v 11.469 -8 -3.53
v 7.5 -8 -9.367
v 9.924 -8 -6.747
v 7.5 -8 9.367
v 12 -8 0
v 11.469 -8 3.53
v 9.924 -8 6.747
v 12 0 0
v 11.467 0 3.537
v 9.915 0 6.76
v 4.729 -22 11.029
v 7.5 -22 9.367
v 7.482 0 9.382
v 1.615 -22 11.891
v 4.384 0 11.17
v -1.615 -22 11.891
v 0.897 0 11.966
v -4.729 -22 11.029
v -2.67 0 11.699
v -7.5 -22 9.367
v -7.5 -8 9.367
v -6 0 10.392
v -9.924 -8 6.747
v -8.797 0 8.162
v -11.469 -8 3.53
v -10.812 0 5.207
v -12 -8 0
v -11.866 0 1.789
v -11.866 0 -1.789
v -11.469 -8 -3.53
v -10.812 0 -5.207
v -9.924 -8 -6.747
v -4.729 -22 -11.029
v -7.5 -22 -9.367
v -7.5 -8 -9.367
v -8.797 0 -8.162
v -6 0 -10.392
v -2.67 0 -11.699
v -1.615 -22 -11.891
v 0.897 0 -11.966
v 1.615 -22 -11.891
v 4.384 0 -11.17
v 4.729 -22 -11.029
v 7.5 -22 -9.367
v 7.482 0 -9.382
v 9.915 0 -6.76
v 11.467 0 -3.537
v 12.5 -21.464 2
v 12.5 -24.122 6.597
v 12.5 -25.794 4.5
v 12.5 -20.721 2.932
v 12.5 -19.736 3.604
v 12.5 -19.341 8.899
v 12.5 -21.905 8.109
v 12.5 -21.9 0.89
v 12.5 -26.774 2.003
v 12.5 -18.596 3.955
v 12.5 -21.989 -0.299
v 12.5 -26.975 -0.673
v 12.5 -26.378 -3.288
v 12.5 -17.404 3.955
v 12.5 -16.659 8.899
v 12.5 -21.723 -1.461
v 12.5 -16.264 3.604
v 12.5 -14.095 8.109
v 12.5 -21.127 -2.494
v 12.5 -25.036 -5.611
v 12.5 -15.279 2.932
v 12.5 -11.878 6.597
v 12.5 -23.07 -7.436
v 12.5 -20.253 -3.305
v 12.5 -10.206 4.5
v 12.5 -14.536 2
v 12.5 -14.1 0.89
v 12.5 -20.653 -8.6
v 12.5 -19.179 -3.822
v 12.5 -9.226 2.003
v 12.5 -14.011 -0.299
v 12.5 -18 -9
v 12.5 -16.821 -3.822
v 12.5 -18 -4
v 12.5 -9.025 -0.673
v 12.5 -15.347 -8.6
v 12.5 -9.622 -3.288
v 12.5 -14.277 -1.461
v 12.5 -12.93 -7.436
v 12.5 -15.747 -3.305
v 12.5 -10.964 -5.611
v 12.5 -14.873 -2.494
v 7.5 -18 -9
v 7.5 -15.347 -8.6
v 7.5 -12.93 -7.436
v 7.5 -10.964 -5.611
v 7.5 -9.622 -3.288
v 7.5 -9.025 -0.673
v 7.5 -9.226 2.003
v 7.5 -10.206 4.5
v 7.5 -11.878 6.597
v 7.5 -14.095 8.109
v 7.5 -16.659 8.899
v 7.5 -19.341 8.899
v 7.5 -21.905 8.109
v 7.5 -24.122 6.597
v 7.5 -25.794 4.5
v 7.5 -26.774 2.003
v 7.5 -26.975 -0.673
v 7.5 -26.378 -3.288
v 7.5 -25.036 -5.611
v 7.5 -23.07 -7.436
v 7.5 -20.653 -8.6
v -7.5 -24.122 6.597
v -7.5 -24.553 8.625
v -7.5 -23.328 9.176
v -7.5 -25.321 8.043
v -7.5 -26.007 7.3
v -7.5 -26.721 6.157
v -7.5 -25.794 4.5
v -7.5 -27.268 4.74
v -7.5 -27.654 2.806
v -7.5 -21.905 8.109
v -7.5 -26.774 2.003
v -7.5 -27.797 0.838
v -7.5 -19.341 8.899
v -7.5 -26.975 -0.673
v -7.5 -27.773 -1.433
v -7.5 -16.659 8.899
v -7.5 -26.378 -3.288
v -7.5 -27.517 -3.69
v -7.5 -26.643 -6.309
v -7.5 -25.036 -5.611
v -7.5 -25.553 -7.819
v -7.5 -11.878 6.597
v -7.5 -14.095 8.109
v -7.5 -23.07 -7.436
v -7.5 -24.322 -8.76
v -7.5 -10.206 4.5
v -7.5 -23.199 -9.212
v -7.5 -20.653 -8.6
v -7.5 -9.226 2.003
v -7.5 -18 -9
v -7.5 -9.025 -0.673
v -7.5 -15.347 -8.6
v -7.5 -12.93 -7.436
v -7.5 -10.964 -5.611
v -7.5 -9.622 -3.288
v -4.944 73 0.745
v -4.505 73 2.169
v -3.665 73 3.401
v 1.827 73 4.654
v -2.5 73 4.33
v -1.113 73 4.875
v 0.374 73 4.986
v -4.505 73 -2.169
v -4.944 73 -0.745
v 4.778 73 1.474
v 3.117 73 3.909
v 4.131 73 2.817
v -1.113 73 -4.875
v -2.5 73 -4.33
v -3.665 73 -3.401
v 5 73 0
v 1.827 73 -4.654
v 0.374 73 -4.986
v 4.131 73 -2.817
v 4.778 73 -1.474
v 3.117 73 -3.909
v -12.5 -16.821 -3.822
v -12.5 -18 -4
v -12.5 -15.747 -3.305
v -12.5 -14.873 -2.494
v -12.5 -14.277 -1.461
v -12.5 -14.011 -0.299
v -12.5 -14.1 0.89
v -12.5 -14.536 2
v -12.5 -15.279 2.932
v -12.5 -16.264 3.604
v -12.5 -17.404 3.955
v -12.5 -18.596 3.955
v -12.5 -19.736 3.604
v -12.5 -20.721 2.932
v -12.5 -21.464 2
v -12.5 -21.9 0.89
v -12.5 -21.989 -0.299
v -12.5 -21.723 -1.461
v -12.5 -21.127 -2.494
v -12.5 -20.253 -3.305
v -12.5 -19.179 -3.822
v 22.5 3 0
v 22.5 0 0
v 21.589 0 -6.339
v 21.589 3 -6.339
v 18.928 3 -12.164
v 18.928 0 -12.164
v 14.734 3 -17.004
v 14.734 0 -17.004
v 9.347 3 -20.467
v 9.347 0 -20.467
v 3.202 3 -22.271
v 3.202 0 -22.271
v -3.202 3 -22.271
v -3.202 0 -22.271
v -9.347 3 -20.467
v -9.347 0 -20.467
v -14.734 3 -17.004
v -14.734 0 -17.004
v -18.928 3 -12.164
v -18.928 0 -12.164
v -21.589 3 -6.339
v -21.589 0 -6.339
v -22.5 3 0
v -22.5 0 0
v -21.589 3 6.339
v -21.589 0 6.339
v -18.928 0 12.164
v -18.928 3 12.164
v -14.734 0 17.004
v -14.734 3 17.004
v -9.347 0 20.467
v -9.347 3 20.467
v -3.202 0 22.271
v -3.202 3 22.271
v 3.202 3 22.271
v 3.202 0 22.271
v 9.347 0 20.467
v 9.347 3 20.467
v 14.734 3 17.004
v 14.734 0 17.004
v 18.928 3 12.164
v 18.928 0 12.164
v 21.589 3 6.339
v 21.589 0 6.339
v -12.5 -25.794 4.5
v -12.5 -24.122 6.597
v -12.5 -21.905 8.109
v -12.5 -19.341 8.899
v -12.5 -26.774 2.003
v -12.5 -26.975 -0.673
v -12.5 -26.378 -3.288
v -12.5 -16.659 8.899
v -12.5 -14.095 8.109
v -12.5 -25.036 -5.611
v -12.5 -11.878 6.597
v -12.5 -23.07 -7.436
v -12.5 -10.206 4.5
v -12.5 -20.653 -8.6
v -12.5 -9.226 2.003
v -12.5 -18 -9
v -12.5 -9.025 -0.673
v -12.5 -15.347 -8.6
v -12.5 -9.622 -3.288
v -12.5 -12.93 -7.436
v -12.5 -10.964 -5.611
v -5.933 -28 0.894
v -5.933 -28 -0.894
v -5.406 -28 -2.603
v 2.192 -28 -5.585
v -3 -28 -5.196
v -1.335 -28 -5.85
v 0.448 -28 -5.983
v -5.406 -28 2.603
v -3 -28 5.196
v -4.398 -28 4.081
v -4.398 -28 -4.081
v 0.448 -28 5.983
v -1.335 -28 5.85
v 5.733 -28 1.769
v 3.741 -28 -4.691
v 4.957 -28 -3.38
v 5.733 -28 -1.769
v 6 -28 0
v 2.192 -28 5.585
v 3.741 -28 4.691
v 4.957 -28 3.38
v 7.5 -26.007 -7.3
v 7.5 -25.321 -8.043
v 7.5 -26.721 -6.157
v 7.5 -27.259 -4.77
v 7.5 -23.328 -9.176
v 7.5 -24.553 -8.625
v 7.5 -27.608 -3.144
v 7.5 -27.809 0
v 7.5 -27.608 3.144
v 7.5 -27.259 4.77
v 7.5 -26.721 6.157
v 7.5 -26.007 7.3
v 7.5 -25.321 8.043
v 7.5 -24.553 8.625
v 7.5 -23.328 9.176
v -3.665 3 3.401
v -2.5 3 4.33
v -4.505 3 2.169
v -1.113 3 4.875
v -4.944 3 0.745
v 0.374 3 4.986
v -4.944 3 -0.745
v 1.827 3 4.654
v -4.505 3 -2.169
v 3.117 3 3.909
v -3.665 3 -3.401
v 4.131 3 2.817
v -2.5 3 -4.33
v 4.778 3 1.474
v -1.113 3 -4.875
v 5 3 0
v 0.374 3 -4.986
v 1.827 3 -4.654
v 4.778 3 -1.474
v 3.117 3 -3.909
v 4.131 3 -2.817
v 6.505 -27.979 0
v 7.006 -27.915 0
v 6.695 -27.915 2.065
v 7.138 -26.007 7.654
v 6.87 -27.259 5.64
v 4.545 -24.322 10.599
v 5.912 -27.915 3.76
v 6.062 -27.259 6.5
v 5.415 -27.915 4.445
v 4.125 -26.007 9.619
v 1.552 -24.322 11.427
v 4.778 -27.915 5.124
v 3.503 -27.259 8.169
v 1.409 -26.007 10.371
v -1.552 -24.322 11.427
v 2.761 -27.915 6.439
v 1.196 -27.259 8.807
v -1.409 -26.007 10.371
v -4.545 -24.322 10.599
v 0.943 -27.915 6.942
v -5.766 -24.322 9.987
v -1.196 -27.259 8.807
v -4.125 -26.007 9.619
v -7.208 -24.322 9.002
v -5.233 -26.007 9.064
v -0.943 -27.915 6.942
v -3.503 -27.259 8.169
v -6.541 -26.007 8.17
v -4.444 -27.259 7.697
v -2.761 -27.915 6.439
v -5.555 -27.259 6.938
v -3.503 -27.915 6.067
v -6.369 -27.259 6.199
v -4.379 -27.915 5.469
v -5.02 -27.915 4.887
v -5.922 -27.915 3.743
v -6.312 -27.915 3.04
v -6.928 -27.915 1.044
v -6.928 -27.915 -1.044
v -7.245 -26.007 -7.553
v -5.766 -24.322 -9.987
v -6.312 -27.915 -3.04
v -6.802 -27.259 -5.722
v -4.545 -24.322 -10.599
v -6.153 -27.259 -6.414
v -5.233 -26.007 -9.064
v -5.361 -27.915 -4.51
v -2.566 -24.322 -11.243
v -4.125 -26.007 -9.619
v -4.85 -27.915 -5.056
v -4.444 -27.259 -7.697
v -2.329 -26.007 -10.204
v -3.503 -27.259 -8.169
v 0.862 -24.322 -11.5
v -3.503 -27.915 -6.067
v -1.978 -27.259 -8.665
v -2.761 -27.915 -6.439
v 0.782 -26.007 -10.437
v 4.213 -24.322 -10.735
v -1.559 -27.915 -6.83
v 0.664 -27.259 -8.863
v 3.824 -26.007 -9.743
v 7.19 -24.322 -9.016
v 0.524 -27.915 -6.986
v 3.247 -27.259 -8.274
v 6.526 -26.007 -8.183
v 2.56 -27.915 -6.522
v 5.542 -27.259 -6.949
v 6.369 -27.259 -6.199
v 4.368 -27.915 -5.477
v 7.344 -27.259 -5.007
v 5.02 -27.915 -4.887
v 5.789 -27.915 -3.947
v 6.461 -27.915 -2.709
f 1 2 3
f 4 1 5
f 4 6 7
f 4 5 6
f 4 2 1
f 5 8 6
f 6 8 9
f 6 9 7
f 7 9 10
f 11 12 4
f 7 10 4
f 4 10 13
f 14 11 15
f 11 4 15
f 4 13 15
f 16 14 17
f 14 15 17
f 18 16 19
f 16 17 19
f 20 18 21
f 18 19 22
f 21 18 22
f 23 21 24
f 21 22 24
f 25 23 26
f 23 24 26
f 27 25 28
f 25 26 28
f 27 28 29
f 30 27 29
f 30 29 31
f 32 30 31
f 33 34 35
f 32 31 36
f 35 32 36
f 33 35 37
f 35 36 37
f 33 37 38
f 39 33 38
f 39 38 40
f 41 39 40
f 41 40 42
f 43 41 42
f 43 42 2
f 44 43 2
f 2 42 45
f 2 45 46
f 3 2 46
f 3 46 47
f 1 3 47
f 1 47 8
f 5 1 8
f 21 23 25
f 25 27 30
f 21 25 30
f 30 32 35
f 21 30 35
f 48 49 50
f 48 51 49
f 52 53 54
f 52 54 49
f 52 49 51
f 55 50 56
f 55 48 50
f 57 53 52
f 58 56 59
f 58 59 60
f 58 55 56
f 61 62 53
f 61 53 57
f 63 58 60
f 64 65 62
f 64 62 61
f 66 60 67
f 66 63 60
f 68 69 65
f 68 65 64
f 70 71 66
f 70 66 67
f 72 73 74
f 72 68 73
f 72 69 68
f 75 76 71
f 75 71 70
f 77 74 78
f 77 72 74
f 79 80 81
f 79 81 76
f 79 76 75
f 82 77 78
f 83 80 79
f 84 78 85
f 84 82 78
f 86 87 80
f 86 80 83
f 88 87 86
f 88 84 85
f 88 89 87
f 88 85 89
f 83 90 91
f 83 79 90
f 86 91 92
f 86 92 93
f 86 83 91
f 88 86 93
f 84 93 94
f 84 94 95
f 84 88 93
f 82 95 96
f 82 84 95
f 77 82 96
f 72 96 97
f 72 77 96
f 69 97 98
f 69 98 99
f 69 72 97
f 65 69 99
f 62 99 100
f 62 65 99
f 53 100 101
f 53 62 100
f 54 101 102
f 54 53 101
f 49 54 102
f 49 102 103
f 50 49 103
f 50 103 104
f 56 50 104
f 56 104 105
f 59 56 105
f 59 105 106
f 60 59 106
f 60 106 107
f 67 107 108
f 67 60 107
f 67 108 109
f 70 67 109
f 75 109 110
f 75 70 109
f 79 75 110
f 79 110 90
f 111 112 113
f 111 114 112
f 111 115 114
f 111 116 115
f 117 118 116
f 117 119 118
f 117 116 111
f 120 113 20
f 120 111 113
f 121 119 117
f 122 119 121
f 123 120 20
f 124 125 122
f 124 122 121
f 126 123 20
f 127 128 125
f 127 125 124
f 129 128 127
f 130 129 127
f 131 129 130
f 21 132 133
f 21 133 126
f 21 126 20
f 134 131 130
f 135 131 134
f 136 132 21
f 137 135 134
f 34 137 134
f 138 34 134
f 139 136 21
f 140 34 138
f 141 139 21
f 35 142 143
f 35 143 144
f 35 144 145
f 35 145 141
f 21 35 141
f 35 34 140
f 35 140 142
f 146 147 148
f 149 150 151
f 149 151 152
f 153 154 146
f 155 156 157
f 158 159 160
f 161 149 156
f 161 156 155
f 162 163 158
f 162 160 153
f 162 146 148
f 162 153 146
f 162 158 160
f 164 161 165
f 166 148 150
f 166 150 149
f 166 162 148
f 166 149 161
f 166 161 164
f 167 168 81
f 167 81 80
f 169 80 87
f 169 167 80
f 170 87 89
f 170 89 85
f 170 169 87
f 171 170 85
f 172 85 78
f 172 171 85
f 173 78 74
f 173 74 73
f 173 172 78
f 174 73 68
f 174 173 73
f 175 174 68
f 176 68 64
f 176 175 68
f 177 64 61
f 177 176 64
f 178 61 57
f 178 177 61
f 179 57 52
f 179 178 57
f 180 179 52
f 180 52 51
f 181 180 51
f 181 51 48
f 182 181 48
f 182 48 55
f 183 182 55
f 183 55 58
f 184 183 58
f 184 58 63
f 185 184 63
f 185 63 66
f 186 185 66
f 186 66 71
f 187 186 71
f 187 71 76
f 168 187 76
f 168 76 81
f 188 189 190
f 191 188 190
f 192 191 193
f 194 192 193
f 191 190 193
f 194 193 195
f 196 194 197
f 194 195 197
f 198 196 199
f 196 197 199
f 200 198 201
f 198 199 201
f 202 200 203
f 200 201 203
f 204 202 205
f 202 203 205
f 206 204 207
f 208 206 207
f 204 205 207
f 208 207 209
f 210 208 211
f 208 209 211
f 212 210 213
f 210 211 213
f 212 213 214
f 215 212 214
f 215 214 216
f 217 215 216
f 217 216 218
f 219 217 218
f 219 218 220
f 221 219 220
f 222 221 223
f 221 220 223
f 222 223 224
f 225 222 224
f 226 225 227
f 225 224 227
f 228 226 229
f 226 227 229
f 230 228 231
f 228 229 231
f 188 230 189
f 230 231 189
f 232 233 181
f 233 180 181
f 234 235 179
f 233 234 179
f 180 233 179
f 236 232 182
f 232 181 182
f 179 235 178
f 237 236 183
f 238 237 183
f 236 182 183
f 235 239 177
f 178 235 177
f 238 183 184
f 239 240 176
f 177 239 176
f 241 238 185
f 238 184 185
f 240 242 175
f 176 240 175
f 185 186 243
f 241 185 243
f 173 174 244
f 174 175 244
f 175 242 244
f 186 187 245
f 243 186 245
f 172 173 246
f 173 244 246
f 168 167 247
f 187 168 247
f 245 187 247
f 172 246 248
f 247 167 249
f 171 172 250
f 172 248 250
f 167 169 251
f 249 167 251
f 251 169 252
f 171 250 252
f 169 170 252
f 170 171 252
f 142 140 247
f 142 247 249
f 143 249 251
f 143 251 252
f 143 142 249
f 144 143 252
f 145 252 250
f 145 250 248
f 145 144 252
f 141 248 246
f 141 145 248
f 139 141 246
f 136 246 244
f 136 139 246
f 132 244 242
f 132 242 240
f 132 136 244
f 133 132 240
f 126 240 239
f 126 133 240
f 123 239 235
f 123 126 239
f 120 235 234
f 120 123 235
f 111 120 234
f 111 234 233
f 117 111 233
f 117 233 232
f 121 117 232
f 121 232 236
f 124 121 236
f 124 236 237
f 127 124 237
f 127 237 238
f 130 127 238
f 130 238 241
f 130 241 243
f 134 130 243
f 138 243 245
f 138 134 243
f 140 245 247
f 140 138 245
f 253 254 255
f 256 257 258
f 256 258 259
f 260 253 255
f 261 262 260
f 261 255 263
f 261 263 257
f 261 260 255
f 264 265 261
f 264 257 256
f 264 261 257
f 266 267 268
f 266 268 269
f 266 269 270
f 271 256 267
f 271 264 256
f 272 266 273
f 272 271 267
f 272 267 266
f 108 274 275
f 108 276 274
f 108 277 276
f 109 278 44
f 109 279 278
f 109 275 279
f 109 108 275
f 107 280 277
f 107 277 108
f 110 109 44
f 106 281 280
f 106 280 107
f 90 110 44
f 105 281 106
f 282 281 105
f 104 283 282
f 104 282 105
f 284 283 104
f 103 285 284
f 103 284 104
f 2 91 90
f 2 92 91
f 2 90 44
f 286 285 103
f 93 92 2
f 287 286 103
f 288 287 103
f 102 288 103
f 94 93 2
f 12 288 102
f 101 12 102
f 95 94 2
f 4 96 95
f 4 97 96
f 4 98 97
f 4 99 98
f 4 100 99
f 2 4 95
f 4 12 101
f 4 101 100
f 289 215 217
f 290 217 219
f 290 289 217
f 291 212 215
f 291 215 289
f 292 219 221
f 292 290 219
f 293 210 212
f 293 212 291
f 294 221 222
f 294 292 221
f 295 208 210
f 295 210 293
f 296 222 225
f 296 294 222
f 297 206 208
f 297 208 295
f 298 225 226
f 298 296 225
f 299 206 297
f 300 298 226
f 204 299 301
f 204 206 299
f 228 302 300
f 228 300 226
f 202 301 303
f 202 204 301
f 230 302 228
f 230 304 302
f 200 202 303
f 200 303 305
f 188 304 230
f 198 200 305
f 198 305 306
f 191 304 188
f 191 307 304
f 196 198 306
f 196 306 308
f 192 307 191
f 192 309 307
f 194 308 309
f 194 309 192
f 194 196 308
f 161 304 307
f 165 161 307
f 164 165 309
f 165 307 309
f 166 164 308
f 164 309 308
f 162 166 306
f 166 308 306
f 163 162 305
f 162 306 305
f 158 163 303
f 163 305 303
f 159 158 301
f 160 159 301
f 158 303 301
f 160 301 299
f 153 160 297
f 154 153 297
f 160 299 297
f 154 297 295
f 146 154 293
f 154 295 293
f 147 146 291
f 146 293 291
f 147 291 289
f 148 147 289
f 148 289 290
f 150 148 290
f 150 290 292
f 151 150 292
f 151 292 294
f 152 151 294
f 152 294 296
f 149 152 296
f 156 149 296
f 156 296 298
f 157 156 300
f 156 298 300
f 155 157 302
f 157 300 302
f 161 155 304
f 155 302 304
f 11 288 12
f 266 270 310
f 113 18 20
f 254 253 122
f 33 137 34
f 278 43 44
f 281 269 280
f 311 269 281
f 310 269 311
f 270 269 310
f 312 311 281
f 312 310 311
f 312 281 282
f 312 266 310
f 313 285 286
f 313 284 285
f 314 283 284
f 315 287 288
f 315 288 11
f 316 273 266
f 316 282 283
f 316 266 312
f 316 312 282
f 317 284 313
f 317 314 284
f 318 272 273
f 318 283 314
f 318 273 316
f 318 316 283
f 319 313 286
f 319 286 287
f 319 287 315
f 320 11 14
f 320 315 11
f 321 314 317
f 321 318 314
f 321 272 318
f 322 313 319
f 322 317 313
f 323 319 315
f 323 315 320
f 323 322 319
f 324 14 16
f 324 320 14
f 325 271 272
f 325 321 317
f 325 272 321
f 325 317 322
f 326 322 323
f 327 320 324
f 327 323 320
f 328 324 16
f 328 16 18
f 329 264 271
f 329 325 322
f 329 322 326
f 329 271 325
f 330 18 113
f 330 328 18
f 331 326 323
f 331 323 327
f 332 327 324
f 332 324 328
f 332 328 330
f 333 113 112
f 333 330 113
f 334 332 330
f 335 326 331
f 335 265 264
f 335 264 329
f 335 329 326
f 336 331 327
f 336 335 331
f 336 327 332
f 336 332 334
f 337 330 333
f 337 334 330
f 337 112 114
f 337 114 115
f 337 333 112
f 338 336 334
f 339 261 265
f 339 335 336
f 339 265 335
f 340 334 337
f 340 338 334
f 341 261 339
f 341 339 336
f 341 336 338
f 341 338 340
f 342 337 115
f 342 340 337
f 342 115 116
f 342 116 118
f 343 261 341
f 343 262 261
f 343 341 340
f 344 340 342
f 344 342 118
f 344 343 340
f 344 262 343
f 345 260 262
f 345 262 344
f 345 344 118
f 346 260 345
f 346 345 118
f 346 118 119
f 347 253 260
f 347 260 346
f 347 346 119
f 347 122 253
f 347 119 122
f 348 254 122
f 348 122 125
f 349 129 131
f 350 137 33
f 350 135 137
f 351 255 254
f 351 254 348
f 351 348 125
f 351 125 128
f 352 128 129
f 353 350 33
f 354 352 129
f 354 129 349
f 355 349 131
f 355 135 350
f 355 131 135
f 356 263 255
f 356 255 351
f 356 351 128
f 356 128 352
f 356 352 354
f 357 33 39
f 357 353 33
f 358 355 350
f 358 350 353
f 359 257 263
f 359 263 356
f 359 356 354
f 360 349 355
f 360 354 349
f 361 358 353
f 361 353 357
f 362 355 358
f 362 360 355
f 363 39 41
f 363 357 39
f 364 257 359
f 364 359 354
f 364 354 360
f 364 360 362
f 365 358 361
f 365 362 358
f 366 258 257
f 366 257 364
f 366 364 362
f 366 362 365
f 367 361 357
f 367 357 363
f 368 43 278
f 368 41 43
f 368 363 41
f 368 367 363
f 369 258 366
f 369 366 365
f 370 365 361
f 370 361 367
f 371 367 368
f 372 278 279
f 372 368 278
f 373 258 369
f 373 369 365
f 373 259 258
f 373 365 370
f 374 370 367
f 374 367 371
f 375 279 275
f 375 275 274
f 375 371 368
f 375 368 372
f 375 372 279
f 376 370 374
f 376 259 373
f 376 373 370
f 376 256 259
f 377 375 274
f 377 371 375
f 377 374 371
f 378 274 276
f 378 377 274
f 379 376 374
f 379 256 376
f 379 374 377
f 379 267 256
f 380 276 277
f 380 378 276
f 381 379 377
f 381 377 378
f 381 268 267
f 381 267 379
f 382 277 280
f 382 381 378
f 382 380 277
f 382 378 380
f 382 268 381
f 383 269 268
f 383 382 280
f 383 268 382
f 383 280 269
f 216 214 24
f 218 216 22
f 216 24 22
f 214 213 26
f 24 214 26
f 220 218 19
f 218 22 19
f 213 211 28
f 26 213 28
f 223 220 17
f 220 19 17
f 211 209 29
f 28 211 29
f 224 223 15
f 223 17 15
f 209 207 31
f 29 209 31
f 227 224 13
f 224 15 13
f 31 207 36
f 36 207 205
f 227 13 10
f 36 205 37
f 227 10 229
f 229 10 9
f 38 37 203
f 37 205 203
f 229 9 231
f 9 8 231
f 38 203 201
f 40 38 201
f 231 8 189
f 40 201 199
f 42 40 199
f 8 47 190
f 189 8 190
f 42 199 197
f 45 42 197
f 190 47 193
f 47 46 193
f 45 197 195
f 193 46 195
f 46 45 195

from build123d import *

# Parameters (mm, degrees)
SKETCH1_R           = 22.5
BOSS_EXTRUDE1_DEPTH = 3
SKETCH2_R           = 5
BOSS_EXTRUDE2_DEPTH = 70
SKETCH3_R           = 12
BOSS_EXTRUDE3_DEPTH = 28
FILLET1_R           = 6
SKETCH4_W           = 14.522746449
SKETCH4_H           = 20
CUT_EXTRUDE2_DEPTH  = 14
SKETCH5_R           = 4
CUT_EXTRUDE3_DEPTH  = 31
SKETCH7_R           = 9
SKETCH7_R_2         = 4
BOSS_EXTRUDE4_DEPTH = 12.5


with BuildPart() as part:
    # Sketch1 → Boss-Extrude1 (new body)
    with BuildSketch(Plane(origin=(0, 0, 0), x_dir=(1, 0, 0), z_dir=(0, 1, 0))):
        Circle(SKETCH1_R)
    extrude(amount=BOSS_EXTRUDE1_DEPTH)

    # Sketch2 → Boss-Extrude2 (add)
    with BuildSketch(Plane(origin=(0, 3, 0), x_dir=(1, 0, 0), z_dir=(0, 1, 0))):
        Circle(SKETCH2_R)
    extrude(amount=BOSS_EXTRUDE2_DEPTH)

    # Sketch3 → Boss-Extrude3 (add)
    with BuildSketch(Plane.XZ):
        Circle(SKETCH3_R)
    extrude(amount=BOSS_EXTRUDE3_DEPTH)

    # Fillet1
    fillet1_edges = [part.edges().sort_by_distance(p)[0] for p in [
        (-12, -28, 0),
    ]]
    fillet(fillet1_edges, radius=FILLET1_R)

    # Sketch4 → Cut-Extrude2 (cut, symmetric)
    with BuildSketch(Plane.XY):
        with Locations((-14.761373225, -18)):
            Rectangle(SKETCH4_W, SKETCH4_H)
        with Locations((14.761373225, -18)):
            Rectangle(SKETCH4_W, SKETCH4_H)
    extrude(amount=CUT_EXTRUDE2_DEPTH, both=True, mode=Mode.SUBTRACT)

    # Sketch5 → Cut-Extrude3 (cut, through all)
    with BuildSketch(Plane(origin=(7.5, 0, 0), x_dir=(0, 0, -1), z_dir=(1, 0, 0))):
        with Locations((0, -18)):
            Circle(SKETCH5_R)
    extrude(amount=-CUT_EXTRUDE3_DEPTH, mode=Mode.SUBTRACT)

    # Sketch7 → Boss-Extrude4 (add, symmetric)
    with BuildSketch(Plane(origin=(0, 0, 0), x_dir=(0, 0, -1), z_dir=(1, 0, 0))):
        with Locations((0, -18)):
            Circle(SKETCH7_R)
        with Locations((0, -18)):
            Circle(SKETCH7_R_2, mode=Mode.SUBTRACT)
    extrude(amount=BOSS_EXTRUDE4_DEPTH, both=True)


solid = part.part
